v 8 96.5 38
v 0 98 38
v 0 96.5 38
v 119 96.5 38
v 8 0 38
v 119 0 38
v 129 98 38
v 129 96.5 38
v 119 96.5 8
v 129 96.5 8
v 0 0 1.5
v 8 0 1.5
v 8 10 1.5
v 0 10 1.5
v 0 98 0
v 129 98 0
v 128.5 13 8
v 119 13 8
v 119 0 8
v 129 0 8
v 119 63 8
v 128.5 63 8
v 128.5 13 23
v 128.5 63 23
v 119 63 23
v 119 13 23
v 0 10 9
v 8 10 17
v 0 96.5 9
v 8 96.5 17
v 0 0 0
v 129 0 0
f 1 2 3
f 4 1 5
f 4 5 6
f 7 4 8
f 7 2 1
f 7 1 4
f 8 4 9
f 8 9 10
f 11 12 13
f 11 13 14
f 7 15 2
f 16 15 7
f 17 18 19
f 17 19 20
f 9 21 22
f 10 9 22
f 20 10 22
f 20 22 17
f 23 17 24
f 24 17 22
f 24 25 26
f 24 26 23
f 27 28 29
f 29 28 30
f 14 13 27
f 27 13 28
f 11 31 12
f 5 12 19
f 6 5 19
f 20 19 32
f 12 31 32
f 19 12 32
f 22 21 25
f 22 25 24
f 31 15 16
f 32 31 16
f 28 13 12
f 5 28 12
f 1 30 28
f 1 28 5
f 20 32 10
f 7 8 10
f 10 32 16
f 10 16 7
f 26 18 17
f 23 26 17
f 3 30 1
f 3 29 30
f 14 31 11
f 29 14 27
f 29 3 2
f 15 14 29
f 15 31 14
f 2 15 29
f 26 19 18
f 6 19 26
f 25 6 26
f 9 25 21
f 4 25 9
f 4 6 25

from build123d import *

# Parameters (mm, degrees)
SKETCH_1_W          = 129
SKETCH_1_H          = 98
EXTRUDE_1_DEPTH     = 38
SKETCH_2_W          = 10
SKETCH_2_H          = 96.5
CUT_EXTRUDE_1_DEPTH = 30
SKETCH_3_W          = 9.5
SKETCH_3_H          = 50
EXTRUDE_2_DEPTH     = 15
SKETCH_4_W          = 29
SKETCH_4_H          = 96.5
CUT_EXTRUDE_2_DEPTH = 8
CHAMFER_1_SIZE      = 8
CUT_EXTRUDE_3_DEPTH = 10


with BuildPart() as part:
    # 草图1 → 凸台-拉伸1 (new body)
    with BuildSketch(Plane.XY):
        with Locations((64.5, 49)):
            Rectangle(SKETCH_1_W, SKETCH_1_H)
    extrude(amount=EXTRUDE_1_DEPTH)

    # 草图2 → 切除-拉伸1 (cut)
    with BuildSketch(Plane.XY.offset(38)):
        with Locations((124, 48.25)):
            Rectangle(SKETCH_2_W, SKETCH_2_H)
    extrude(amount=-CUT_EXTRUDE_1_DEPTH, mode=Mode.SUBTRACT)

    # 草图3 → 凸台-拉伸2 (add)
    with BuildSketch(Plane.XY.offset(8)):
        with Locations((123.75, 38)):
            Rectangle(SKETCH_3_W, SKETCH_3_H)
    extrude(amount=EXTRUDE_2_DEPTH)

    # 草图4 → 切除-拉伸2 (cut)
    with BuildSketch(Plane.ZY):
        with Locations((23.5, 48.25)):
            Rectangle(SKETCH_4_W, SKETCH_4_H)
    extrude(amount=-CUT_EXTRUDE_2_DEPTH, mode=Mode.SUBTRACT)

    # 倒角1
    chamfer_1_edges = [part.edges().sort_by_distance(p)[0] for p in [
        (8, 48.25, 9),
    ]]
    chamfer(chamfer_1_edges, length=CHAMFER_1_SIZE - 0.0001)  # a hair under: the kernel refuses the full size

    # 草图5 → 切除-拉伸3 (cut)
    with BuildSketch(Plane.XZ):
        Polygon((0, 9), (8, 17), (8, 1.5), (0, 1.5), align=None)
    extrude(amount=-CUT_EXTRUDE_3_DEPTH, mode=Mode.SUBTRACT)


solid = part.part
